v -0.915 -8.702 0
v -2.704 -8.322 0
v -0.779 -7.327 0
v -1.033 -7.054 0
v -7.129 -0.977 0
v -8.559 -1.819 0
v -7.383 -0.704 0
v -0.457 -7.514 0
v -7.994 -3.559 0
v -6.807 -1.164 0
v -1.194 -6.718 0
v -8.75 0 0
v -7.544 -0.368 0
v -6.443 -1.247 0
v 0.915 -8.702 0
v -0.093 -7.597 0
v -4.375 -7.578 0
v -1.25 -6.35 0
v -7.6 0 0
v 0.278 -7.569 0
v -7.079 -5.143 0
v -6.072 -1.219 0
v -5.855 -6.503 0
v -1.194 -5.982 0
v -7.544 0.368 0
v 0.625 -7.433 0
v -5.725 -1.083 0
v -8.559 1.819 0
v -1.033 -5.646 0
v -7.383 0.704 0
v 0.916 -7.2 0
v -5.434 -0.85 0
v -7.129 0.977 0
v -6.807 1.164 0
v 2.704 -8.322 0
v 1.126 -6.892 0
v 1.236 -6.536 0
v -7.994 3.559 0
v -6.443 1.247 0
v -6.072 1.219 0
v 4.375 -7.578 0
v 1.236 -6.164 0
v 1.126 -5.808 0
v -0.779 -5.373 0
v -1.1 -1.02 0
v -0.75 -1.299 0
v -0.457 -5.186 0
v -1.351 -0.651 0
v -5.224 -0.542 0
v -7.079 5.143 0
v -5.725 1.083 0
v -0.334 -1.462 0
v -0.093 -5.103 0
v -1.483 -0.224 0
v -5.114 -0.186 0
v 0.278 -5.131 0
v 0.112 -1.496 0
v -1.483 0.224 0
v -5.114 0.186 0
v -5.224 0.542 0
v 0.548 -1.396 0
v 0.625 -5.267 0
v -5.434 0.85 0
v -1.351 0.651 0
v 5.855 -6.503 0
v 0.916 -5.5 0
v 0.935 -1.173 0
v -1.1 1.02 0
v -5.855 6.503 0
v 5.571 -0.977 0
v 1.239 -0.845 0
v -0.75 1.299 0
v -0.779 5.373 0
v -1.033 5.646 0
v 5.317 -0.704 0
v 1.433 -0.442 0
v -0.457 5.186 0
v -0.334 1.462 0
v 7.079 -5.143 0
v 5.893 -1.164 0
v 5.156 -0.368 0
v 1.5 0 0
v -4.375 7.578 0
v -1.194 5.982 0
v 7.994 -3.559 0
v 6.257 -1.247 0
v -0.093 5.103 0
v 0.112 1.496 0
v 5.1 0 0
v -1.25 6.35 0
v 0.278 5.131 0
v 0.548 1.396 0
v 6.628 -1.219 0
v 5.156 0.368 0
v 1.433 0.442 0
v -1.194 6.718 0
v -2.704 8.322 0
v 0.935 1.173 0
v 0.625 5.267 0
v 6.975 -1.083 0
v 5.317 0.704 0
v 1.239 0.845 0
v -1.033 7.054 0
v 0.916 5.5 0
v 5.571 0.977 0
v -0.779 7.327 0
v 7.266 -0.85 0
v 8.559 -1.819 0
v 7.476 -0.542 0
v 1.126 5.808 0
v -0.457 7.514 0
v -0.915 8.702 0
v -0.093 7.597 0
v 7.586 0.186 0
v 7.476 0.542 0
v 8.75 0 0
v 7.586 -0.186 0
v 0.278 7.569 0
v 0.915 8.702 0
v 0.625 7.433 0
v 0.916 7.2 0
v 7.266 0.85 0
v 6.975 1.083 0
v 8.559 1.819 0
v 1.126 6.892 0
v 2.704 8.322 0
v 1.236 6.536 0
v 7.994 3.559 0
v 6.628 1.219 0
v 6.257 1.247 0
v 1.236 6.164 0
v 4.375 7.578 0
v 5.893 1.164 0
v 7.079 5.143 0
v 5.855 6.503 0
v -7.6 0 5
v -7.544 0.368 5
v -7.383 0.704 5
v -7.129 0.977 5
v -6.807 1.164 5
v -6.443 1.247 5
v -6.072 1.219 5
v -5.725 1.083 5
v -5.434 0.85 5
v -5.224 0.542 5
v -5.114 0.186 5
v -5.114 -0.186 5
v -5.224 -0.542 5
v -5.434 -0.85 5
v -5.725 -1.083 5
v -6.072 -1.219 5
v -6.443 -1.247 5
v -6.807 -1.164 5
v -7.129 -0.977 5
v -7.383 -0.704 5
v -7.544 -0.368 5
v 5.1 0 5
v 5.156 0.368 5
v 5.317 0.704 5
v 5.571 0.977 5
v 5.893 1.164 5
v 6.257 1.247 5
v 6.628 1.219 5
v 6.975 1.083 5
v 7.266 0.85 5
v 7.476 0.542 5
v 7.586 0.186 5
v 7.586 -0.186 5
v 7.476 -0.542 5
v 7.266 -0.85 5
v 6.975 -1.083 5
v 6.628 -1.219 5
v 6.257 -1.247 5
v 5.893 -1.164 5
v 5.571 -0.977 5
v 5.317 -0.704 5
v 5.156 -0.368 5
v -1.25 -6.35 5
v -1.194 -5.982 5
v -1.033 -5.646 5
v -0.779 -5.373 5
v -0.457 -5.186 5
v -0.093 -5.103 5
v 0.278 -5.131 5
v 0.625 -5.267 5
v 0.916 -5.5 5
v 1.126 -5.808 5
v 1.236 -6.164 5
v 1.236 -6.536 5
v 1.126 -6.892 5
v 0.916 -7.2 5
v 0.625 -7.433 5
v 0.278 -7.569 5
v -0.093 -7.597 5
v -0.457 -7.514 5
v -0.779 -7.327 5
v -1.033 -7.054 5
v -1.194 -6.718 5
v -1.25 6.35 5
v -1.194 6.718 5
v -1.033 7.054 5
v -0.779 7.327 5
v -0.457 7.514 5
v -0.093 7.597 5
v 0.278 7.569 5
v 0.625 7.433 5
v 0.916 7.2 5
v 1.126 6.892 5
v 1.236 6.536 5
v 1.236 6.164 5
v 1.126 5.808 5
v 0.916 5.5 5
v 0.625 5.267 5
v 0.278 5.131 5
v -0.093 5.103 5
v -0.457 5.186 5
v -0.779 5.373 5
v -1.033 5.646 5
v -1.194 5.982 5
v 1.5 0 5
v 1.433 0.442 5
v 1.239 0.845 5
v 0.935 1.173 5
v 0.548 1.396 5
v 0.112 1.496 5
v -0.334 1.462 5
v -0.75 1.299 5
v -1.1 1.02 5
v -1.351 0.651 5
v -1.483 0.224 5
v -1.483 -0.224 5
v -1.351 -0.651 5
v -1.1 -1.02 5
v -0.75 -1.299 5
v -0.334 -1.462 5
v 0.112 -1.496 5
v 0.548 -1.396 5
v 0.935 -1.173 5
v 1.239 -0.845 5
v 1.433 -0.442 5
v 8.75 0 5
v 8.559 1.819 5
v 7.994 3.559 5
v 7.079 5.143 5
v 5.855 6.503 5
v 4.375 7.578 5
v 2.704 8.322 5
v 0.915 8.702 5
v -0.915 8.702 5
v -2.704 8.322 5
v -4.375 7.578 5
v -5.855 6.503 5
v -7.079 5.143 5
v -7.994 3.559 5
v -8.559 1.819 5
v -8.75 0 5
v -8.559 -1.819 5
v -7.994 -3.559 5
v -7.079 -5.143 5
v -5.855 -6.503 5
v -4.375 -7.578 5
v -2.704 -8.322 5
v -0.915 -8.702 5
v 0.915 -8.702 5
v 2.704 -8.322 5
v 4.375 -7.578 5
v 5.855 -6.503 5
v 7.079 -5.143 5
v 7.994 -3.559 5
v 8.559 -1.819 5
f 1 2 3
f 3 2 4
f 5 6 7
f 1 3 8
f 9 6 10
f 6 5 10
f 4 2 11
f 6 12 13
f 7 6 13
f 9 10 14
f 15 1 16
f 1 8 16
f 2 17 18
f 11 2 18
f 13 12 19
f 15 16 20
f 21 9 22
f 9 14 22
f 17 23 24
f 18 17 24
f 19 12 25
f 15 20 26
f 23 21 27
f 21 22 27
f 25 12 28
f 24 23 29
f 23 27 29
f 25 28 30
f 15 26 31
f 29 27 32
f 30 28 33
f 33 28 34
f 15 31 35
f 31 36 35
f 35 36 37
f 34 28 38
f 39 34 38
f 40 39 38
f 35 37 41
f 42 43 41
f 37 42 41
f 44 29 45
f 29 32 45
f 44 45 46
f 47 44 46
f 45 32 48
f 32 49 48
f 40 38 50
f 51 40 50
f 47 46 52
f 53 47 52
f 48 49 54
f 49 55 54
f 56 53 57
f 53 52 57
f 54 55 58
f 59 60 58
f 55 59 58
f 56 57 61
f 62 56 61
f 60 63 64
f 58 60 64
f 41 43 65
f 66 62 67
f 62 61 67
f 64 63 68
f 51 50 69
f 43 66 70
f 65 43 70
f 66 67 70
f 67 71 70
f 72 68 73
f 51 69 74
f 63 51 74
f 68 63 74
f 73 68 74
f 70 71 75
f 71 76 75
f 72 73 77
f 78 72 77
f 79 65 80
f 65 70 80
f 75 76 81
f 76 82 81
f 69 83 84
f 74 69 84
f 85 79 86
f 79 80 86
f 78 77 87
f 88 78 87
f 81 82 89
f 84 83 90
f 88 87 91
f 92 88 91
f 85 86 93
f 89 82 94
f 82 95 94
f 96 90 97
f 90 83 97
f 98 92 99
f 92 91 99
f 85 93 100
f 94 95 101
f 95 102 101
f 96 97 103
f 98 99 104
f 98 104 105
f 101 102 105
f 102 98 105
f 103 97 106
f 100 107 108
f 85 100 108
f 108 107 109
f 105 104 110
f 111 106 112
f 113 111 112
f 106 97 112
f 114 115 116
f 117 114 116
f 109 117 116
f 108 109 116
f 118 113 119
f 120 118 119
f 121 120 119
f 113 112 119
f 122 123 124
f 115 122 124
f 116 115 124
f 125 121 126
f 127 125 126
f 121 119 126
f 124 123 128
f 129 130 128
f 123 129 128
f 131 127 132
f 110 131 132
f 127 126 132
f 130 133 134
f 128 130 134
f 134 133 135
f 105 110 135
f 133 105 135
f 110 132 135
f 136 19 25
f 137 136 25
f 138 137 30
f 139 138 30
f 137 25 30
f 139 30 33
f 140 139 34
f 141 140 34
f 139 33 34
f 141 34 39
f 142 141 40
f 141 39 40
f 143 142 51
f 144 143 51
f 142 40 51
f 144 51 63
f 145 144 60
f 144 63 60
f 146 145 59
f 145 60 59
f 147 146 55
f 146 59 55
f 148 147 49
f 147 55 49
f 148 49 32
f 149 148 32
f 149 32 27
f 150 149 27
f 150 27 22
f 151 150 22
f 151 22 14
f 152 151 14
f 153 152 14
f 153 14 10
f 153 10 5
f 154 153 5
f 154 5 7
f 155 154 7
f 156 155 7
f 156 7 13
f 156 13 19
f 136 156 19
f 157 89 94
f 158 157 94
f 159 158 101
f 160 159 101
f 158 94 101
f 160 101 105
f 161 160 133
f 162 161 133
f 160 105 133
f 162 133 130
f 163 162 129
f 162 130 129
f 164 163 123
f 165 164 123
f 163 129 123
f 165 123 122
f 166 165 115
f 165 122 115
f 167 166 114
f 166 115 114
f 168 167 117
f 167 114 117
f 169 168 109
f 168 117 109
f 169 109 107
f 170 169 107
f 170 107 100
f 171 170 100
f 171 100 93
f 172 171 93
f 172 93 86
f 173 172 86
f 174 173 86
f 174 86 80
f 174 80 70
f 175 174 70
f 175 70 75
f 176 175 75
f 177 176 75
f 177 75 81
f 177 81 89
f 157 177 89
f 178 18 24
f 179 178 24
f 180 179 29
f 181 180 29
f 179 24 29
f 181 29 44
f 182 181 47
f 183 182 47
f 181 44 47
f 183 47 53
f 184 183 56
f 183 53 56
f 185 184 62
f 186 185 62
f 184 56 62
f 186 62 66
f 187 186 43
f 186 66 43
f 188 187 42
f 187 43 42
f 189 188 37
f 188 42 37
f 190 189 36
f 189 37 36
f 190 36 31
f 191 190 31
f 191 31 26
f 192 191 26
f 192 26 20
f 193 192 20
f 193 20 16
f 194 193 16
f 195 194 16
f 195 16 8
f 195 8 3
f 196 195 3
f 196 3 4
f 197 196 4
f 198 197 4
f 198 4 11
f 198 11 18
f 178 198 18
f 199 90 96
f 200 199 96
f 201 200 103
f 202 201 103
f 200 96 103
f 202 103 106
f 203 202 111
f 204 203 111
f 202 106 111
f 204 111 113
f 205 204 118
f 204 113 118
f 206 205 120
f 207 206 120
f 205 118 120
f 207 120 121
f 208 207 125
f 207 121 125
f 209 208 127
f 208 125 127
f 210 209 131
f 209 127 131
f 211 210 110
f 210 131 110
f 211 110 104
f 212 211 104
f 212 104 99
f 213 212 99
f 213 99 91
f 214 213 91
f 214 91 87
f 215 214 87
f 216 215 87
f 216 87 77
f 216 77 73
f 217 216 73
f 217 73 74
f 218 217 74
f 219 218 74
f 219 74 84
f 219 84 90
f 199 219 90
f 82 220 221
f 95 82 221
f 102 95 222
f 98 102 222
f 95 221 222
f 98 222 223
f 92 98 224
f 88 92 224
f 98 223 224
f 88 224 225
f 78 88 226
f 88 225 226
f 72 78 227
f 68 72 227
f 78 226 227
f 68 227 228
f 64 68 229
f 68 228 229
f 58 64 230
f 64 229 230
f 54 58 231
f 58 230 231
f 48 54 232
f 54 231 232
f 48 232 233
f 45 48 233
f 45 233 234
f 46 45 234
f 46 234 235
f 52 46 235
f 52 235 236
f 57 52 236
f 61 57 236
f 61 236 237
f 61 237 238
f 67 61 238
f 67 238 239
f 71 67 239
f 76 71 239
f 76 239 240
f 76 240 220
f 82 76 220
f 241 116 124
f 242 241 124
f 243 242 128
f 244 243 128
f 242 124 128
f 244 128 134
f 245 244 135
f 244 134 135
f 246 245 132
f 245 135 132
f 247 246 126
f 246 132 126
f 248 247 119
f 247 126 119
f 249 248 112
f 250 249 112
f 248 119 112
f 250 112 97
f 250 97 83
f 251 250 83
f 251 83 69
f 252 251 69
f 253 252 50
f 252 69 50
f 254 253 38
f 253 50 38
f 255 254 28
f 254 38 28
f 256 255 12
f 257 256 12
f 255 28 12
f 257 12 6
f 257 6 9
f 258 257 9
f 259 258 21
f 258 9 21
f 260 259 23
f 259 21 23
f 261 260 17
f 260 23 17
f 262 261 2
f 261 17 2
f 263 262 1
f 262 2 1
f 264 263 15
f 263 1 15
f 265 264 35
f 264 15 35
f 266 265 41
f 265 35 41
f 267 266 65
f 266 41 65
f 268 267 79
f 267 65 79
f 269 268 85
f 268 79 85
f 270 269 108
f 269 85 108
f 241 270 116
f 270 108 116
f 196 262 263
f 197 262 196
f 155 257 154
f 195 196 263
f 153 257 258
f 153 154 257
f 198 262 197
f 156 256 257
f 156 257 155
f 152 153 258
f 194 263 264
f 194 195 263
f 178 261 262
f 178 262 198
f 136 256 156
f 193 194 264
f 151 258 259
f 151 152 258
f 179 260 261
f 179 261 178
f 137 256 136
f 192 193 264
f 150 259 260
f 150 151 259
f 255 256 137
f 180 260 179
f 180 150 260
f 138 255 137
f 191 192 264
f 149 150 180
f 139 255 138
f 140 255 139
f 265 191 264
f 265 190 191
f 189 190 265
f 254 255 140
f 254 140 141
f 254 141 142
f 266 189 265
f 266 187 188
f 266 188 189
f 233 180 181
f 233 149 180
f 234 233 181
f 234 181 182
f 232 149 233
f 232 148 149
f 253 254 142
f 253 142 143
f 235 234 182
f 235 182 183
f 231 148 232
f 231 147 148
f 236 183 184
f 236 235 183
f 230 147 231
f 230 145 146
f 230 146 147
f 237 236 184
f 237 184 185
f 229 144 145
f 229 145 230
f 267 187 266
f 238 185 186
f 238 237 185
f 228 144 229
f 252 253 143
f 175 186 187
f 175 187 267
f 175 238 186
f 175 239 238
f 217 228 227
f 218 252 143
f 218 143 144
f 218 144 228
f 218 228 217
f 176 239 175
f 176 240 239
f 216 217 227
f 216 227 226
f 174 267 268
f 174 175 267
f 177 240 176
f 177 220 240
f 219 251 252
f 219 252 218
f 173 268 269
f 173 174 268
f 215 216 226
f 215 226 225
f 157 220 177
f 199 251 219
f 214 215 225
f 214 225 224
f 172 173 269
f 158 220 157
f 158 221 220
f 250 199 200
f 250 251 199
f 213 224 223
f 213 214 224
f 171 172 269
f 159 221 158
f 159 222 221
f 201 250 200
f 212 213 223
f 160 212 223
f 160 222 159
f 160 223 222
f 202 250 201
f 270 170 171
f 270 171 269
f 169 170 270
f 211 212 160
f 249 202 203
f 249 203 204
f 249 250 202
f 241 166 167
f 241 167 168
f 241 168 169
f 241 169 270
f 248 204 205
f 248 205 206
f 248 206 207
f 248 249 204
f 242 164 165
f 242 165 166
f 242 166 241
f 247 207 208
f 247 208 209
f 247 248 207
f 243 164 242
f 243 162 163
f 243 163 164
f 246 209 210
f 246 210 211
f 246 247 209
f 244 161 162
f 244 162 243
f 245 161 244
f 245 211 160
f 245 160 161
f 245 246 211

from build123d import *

# Parameters (mm, degrees)
SKETCH_1_R             = 8.75
EXTRUDE_1_DEPTH        = 5
HOLE_WIZARD_M3_1_D     = 2.5
HOLE_WIZARD_M3_1_DEPTH = 5
SKETCH_4_R             = 1.5
CUT_EXTRUDE_1_DEPTH    = 6


with BuildPart() as part:
    # 스케치1 → 보스-돌출1 (new body)
    with BuildSketch(Plane.XY):
        Circle(SKETCH_1_R)
    extrude(amount=EXTRUDE_1_DEPTH)

    # M3 나사 구멍1
    with Locations(Plane.XY.offset(5)):
        with Locations((0, 6.35), (6.35, 0), (0, -6.35), (-6.35, 0)):
            Hole(HOLE_WIZARD_M3_1_D / 2, depth=HOLE_WIZARD_M3_1_DEPTH)

    # 스케치4 → 컷-돌출1 (cut, through all)
    with BuildSketch(Plane.XY.offset(5)):
        Circle(SKETCH_4_R)
    extrude(amount=-CUT_EXTRUDE_1_DEPTH, mode=Mode.SUBTRACT)


solid = part.part
